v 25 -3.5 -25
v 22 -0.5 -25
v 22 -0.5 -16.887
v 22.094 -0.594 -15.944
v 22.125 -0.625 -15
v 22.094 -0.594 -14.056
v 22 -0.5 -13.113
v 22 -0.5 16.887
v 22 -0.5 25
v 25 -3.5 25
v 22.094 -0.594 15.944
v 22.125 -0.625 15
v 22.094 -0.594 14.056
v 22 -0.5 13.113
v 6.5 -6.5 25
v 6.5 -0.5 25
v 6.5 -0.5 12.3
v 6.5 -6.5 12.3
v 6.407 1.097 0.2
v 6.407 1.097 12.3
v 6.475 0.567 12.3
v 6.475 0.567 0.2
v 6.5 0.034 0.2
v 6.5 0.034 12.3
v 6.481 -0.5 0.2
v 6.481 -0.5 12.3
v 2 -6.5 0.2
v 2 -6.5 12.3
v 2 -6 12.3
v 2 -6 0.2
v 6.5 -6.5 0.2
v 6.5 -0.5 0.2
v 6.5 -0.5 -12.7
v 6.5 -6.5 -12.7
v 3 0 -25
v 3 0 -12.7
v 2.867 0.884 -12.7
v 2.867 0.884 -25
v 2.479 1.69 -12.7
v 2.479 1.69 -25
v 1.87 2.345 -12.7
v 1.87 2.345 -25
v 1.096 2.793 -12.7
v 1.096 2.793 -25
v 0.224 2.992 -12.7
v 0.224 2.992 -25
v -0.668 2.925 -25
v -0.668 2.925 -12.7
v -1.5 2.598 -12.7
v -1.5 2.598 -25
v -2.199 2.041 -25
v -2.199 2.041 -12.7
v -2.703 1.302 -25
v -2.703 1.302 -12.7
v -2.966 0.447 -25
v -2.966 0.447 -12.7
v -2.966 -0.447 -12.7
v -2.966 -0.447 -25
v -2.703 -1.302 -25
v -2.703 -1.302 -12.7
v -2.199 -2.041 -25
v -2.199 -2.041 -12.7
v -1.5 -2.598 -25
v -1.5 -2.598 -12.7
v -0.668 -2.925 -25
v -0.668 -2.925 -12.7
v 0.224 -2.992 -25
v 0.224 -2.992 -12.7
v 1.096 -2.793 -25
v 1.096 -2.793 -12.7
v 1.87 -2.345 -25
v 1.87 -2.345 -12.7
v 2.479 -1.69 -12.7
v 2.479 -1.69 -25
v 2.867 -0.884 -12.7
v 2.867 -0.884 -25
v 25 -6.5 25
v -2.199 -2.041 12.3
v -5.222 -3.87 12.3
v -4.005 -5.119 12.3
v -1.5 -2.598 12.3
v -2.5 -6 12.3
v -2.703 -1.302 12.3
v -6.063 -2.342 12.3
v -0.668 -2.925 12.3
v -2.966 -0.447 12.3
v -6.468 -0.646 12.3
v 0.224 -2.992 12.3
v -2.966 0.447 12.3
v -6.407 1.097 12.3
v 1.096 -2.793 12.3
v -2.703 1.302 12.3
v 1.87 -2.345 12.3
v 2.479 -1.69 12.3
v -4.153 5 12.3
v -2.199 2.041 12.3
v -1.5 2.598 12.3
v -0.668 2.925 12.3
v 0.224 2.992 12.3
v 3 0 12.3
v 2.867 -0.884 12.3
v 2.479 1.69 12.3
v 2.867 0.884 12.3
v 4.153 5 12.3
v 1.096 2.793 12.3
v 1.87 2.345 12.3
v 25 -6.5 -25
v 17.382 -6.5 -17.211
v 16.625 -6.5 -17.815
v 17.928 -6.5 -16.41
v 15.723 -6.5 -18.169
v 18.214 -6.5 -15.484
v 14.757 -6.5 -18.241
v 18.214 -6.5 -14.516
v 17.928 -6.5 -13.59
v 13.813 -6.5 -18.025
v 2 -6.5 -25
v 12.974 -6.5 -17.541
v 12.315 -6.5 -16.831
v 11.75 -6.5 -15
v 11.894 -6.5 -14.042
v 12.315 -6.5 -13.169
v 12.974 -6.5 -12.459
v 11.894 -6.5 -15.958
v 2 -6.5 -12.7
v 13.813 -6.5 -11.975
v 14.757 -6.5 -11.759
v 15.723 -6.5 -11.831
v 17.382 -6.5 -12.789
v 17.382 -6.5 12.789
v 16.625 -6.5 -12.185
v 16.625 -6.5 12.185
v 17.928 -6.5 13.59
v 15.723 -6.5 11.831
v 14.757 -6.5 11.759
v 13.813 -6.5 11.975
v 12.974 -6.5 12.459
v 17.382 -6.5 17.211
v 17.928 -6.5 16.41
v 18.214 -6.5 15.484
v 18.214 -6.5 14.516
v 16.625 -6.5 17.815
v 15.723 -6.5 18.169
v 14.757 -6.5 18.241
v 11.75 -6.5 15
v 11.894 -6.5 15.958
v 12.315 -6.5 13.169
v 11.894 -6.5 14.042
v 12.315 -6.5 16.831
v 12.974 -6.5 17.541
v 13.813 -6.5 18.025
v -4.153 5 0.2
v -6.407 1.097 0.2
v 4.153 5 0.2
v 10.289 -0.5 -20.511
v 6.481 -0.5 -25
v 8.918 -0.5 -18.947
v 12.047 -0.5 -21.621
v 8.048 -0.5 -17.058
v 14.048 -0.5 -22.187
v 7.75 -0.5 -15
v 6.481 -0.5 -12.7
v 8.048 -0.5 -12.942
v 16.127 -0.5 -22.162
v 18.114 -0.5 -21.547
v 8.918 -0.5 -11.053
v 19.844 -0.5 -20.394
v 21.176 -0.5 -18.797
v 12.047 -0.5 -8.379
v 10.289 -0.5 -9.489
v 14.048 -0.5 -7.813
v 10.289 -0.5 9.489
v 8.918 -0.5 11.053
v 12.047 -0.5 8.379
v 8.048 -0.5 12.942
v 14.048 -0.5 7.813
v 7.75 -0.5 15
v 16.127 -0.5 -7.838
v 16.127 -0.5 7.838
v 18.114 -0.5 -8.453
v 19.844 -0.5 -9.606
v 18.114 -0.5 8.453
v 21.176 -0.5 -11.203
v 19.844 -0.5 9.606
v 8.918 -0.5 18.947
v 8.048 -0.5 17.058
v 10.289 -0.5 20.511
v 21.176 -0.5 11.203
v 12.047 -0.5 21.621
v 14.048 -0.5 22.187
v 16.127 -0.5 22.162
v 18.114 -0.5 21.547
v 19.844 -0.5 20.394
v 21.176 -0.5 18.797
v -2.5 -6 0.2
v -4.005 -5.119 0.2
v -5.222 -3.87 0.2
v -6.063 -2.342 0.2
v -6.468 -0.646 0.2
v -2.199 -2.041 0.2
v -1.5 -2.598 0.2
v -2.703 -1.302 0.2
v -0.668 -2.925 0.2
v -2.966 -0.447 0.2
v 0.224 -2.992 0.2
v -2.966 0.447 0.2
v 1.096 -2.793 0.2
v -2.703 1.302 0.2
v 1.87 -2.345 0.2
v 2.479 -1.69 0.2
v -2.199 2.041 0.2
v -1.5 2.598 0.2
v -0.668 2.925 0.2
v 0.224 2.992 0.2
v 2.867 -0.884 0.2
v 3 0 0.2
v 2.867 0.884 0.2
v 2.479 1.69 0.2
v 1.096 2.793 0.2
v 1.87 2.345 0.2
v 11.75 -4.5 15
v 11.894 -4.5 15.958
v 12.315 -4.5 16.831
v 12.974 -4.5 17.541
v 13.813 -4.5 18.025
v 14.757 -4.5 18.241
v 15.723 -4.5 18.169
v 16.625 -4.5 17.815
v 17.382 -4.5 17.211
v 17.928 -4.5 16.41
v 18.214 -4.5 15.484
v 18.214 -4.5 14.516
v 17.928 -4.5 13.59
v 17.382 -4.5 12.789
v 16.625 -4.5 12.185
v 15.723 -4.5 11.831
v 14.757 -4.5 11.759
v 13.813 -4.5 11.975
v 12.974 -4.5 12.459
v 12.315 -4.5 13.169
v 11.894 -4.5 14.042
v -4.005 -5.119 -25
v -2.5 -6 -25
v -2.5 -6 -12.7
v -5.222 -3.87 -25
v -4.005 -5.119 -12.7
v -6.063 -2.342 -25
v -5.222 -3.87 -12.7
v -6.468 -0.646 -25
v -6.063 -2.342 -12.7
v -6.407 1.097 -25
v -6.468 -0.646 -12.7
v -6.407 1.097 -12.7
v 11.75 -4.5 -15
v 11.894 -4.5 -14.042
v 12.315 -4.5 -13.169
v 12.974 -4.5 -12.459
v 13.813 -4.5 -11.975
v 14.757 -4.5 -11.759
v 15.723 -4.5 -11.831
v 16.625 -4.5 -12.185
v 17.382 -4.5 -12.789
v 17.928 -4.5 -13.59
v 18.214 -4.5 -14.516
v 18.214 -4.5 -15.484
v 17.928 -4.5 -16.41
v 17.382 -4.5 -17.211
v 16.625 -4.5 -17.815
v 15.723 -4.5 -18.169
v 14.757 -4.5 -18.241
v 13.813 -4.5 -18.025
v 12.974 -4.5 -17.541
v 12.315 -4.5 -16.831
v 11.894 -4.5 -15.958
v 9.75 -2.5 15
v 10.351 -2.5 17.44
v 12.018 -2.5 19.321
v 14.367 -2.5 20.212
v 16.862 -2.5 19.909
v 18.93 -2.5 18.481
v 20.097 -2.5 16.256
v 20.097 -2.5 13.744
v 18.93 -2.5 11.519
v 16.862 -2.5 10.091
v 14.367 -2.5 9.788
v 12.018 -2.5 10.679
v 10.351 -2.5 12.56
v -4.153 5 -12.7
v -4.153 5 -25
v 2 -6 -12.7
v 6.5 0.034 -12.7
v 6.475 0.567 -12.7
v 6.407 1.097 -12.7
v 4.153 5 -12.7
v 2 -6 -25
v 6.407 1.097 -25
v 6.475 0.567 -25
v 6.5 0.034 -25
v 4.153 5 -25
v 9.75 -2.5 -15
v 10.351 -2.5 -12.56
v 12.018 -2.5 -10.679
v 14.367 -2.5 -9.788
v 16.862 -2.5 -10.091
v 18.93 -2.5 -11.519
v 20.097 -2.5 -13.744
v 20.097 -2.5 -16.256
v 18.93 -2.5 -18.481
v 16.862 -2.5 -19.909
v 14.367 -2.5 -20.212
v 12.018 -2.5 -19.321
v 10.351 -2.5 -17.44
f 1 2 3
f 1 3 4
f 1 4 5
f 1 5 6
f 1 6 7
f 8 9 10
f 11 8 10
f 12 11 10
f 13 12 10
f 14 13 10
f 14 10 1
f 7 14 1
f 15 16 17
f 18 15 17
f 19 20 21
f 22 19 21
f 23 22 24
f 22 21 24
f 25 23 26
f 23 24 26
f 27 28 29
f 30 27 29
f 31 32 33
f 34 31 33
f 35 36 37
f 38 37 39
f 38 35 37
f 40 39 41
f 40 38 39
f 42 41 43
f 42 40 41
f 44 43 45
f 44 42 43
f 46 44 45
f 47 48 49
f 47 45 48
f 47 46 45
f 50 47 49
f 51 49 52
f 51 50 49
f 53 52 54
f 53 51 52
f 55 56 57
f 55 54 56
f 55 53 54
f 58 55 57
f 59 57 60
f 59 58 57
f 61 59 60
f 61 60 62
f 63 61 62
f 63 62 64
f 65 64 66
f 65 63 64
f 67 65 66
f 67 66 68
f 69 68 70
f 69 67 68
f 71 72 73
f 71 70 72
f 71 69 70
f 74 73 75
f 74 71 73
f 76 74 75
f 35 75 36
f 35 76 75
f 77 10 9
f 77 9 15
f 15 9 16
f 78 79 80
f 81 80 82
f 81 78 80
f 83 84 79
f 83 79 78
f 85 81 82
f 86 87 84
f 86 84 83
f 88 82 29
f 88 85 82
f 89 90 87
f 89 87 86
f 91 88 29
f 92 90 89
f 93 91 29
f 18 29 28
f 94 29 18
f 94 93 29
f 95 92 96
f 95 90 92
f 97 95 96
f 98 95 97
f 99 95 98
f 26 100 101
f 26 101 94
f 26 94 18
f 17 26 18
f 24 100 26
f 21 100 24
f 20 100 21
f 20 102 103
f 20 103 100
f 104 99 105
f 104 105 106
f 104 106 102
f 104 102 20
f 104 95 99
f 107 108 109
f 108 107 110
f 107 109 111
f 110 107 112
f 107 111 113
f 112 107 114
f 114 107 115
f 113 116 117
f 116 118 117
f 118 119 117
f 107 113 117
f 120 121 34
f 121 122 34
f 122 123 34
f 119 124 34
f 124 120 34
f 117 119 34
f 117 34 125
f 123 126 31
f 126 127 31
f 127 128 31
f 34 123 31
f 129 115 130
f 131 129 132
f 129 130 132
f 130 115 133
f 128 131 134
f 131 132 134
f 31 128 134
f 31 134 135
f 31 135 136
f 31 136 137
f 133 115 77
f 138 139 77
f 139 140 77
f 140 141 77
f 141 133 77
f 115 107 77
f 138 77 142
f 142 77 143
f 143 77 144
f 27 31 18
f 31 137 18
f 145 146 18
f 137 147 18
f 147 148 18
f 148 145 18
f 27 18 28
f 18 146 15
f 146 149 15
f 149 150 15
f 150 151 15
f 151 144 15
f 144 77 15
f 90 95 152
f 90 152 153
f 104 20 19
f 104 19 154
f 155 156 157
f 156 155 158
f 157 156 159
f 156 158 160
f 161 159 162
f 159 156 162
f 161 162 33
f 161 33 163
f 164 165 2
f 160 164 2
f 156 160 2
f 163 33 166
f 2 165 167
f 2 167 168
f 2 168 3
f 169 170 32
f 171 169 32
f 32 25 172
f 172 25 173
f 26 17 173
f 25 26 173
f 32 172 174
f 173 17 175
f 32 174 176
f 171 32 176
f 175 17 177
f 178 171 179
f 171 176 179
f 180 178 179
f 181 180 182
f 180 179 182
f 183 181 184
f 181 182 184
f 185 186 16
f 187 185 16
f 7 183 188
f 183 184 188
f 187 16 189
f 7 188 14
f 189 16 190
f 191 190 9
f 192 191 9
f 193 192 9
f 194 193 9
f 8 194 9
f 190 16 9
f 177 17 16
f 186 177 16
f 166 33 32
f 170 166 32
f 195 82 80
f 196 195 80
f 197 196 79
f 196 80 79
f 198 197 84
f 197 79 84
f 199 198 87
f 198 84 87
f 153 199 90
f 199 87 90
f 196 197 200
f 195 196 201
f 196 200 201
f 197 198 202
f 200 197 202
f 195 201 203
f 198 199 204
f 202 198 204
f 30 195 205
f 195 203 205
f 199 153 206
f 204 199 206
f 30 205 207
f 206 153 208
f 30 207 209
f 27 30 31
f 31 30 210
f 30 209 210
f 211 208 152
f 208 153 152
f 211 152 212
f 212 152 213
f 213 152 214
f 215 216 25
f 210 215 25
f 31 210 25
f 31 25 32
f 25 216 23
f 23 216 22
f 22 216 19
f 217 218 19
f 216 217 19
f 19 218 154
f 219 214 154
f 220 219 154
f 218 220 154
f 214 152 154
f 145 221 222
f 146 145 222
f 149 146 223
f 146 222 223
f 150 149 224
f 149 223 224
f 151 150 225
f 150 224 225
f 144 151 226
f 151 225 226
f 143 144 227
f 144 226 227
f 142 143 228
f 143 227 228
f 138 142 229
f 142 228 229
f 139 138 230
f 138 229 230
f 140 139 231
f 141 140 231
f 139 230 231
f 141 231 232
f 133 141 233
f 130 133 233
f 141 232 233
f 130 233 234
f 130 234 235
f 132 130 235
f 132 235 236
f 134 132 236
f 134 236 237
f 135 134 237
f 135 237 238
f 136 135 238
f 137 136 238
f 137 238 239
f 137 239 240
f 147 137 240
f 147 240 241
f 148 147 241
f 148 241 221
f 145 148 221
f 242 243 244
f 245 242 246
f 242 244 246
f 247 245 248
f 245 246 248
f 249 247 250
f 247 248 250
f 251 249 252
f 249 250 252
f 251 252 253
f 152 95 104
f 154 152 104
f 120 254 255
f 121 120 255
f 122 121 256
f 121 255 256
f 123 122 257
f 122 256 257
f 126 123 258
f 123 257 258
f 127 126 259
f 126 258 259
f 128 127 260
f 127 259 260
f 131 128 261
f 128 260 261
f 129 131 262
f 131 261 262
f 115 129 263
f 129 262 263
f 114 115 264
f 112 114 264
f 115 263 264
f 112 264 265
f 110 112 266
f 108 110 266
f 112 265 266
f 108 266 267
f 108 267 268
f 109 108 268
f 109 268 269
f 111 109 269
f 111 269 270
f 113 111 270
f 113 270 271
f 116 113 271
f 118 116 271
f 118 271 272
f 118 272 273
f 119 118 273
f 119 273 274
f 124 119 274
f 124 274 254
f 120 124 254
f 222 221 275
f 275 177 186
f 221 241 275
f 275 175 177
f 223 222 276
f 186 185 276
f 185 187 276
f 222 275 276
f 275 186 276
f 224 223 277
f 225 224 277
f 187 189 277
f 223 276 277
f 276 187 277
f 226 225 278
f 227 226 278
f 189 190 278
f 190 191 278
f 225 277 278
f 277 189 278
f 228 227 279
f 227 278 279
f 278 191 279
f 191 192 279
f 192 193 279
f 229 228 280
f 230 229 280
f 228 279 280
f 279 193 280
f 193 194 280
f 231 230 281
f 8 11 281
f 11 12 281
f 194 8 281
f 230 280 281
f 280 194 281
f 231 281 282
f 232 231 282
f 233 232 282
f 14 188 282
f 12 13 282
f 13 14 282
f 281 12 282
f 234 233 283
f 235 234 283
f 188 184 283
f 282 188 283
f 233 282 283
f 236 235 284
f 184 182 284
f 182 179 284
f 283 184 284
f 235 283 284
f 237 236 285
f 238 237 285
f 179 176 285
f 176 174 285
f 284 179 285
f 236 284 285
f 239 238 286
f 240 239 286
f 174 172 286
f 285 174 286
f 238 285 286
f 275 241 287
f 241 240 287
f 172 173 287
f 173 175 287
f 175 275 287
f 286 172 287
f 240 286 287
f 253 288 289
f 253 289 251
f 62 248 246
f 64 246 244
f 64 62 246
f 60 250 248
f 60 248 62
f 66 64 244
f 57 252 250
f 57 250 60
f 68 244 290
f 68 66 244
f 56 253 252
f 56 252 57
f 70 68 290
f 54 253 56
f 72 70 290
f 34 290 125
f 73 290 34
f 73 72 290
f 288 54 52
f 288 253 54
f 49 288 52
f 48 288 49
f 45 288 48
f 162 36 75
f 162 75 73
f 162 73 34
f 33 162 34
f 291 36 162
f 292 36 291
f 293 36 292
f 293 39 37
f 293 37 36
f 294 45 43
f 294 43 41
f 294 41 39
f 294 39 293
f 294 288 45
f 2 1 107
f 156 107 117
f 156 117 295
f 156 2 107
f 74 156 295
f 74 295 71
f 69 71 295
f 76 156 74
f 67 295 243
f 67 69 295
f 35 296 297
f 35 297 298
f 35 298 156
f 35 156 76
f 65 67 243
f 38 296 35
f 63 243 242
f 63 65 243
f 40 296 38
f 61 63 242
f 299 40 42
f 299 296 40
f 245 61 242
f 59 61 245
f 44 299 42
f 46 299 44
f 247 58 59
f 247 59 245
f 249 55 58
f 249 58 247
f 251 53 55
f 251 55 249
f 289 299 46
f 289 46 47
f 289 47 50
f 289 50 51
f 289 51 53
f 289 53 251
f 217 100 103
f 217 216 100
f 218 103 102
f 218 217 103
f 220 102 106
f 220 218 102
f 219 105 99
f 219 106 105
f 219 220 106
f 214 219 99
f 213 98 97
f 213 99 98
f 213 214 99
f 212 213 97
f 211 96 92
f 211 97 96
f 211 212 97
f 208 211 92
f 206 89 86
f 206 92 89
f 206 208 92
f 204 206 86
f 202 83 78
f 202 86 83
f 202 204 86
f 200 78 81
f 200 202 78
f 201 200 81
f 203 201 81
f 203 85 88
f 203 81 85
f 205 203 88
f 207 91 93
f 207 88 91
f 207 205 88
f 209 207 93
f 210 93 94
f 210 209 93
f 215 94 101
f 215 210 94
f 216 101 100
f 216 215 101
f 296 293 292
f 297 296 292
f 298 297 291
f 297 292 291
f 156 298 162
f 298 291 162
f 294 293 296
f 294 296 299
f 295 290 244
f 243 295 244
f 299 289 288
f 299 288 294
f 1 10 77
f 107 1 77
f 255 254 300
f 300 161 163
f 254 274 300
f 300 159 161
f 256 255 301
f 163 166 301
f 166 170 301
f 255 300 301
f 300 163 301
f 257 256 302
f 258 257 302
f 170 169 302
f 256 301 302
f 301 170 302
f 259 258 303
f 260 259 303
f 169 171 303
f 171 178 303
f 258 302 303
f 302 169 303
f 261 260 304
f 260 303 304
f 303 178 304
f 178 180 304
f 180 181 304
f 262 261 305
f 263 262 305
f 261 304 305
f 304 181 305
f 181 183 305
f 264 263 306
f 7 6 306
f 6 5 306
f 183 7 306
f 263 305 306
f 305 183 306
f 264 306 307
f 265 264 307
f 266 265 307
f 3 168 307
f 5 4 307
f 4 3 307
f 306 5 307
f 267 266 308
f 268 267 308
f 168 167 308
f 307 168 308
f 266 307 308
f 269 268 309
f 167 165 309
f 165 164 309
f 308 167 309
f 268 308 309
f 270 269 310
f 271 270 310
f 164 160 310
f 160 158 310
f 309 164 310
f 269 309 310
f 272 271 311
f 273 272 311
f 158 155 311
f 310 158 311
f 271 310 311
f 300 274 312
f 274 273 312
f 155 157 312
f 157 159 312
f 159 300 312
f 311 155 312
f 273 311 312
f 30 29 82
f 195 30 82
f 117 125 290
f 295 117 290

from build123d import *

# Parameters (mm, degrees)
SKETCH2_R           = 3
BOSS_EXTRUDE1_DEPTH = 25
SKETCH3_R           = 3.25
CUT_EXTRUDE1_DEPTH  = 36.860842154
CHAMFER1_SIZE       = 4
CUT_EXTRUDE2_DEPTH  = 57.278326201
SKETCH5_W           = 13
SKETCH5_H           = 12.5
CUT_EXTRUDE3_DEPTH  = 38.17862289
SKETCH6_W           = 13
SKETCH6_H           = 0.2
CUT_EXTRUDE4_DEPTH  = 38.17862289


with BuildPart() as part:
    # Sketch2 → Boss-Extrude1 (new, symmetric)
    with BuildSketch(Plane.XY):
        with BuildLine():
            Line((25, -6.5), (2, -6.5))
            Line((2, -6.5), (2, -6))
            Line((2, -6), (-2.5, -6))
            ThreePointArc((-2.5, -6), (-6.427802106, -0.966105629), (-4.153311931, 5))
            Line((-4.153311931, 5), (4.153311931, 5))
            ThreePointArc((4.153311931, 5), (5.986089611, 2.533126757), (6.480740698, -0.5))
            Line((6.480740698, -0.5), (22, -0.5))
            Line((22, -0.5), (25, -3.5))
            Line((25, -3.5), (25, -6.5))
        make_face()
        Circle(SKETCH2_R, mode=Mode.SUBTRACT)
    extrude(amount=BOSS_EXTRUDE1_DEPTH, both=True)

    # Sketch3 → Cut-Extrude1 (cut, through all)
    with BuildSketch(Plane(origin=(0, -0.5, 0), x_dir=(1, 0, 0), z_dir=(0, 1, 0))):
        with Locations(Location((15, 15, 0), (0, 0, 180))):
            Circle(SKETCH3_R)
        with Locations(Location((15, -15, 0), (0, 0, 180))):
            Circle(SKETCH3_R)
    extrude(amount=-CUT_EXTRUDE1_DEPTH, mode=Mode.SUBTRACT)

    # Chamfer1
    # the kernel refuses this chamfer: 4 mm, written as the material it takes off along each edge
    with BuildSketch(Plane(origin=(15, -0.5, -15), x_dir=(-1, 0, 0), z_dir=(0, 0, -1))) as chamfer1_piece_1:
        Polygon((3.25, -CHAMFER1_SIZE), (3.25 + CHAMFER1_SIZE, 0), (3.25, 0), align=None)
    revolve(axis=Axis((15, -0.5, -15), (0, 1, 0)), mode=Mode.SUBTRACT)
    with BuildSketch(Plane(origin=(15, -0.5, 15), x_dir=(-1, 0, 0), z_dir=(0, 0, -1))) as chamfer1_piece_2:
        Polygon((3.25, -CHAMFER1_SIZE), (3.25 + CHAMFER1_SIZE, 0), (3.25, 0), align=None)
    revolve(axis=Axis((15, -0.5, 15), (0, 1, 0)), mode=Mode.SUBTRACT)

    # Sketch4 → Cut-Extrude2 (cut, through all)
    with BuildSketch(Plane.XY.offset(25)):
        with BuildLine():
            Line((6.406782985, 1.096873642), (4.153311931, 5))
            ThreePointArc((4.153311931, 5), (5.629165125, 3.25), (6.406782985, 1.096873642))
        make_face()
        with BuildLine():
            Line((-4.153311931, 5), (-6.406782985, 1.096873642))
            ThreePointArc((-6.406782985, 1.096873642), (-5.629165125, 3.25), (-4.153311931, 5))
        make_face()
    extrude(amount=-CUT_EXTRUDE2_DEPTH, mode=Mode.SUBTRACT)

    # Sketch5 → Cut-Extrude3 (cut, through all)
    with BuildSketch(Plane(origin=(0, 5, 0), x_dir=(1, 0, 0), z_dir=(0, 1, 0))):
        with Locations((0, -18.75)):
            Rectangle(SKETCH5_W, SKETCH5_H)
        with Locations((0, 6.25)):
            Rectangle(SKETCH5_W, SKETCH5_H)
    extrude(amount=-CUT_EXTRUDE3_DEPTH, mode=Mode.SUBTRACT)

    # Sketch6 → Cut-Extrude4 (cut, through all)
    with BuildSketch(Plane(origin=(0, 5, 0), x_dir=(1, 0, 0), z_dir=(0, 1, 0))):
        with Locations((0, -0.1)):
            Rectangle(SKETCH6_W, SKETCH6_H)
        with Locations((0, -12.4)):
            Rectangle(SKETCH6_W, SKETCH6_H)
        with Locations((0, 12.6)):
            Rectangle(SKETCH6_W, SKETCH6_H)
    extrude(amount=-CUT_EXTRUDE4_DEPTH, mode=Mode.SUBTRACT)


solid = part.part
